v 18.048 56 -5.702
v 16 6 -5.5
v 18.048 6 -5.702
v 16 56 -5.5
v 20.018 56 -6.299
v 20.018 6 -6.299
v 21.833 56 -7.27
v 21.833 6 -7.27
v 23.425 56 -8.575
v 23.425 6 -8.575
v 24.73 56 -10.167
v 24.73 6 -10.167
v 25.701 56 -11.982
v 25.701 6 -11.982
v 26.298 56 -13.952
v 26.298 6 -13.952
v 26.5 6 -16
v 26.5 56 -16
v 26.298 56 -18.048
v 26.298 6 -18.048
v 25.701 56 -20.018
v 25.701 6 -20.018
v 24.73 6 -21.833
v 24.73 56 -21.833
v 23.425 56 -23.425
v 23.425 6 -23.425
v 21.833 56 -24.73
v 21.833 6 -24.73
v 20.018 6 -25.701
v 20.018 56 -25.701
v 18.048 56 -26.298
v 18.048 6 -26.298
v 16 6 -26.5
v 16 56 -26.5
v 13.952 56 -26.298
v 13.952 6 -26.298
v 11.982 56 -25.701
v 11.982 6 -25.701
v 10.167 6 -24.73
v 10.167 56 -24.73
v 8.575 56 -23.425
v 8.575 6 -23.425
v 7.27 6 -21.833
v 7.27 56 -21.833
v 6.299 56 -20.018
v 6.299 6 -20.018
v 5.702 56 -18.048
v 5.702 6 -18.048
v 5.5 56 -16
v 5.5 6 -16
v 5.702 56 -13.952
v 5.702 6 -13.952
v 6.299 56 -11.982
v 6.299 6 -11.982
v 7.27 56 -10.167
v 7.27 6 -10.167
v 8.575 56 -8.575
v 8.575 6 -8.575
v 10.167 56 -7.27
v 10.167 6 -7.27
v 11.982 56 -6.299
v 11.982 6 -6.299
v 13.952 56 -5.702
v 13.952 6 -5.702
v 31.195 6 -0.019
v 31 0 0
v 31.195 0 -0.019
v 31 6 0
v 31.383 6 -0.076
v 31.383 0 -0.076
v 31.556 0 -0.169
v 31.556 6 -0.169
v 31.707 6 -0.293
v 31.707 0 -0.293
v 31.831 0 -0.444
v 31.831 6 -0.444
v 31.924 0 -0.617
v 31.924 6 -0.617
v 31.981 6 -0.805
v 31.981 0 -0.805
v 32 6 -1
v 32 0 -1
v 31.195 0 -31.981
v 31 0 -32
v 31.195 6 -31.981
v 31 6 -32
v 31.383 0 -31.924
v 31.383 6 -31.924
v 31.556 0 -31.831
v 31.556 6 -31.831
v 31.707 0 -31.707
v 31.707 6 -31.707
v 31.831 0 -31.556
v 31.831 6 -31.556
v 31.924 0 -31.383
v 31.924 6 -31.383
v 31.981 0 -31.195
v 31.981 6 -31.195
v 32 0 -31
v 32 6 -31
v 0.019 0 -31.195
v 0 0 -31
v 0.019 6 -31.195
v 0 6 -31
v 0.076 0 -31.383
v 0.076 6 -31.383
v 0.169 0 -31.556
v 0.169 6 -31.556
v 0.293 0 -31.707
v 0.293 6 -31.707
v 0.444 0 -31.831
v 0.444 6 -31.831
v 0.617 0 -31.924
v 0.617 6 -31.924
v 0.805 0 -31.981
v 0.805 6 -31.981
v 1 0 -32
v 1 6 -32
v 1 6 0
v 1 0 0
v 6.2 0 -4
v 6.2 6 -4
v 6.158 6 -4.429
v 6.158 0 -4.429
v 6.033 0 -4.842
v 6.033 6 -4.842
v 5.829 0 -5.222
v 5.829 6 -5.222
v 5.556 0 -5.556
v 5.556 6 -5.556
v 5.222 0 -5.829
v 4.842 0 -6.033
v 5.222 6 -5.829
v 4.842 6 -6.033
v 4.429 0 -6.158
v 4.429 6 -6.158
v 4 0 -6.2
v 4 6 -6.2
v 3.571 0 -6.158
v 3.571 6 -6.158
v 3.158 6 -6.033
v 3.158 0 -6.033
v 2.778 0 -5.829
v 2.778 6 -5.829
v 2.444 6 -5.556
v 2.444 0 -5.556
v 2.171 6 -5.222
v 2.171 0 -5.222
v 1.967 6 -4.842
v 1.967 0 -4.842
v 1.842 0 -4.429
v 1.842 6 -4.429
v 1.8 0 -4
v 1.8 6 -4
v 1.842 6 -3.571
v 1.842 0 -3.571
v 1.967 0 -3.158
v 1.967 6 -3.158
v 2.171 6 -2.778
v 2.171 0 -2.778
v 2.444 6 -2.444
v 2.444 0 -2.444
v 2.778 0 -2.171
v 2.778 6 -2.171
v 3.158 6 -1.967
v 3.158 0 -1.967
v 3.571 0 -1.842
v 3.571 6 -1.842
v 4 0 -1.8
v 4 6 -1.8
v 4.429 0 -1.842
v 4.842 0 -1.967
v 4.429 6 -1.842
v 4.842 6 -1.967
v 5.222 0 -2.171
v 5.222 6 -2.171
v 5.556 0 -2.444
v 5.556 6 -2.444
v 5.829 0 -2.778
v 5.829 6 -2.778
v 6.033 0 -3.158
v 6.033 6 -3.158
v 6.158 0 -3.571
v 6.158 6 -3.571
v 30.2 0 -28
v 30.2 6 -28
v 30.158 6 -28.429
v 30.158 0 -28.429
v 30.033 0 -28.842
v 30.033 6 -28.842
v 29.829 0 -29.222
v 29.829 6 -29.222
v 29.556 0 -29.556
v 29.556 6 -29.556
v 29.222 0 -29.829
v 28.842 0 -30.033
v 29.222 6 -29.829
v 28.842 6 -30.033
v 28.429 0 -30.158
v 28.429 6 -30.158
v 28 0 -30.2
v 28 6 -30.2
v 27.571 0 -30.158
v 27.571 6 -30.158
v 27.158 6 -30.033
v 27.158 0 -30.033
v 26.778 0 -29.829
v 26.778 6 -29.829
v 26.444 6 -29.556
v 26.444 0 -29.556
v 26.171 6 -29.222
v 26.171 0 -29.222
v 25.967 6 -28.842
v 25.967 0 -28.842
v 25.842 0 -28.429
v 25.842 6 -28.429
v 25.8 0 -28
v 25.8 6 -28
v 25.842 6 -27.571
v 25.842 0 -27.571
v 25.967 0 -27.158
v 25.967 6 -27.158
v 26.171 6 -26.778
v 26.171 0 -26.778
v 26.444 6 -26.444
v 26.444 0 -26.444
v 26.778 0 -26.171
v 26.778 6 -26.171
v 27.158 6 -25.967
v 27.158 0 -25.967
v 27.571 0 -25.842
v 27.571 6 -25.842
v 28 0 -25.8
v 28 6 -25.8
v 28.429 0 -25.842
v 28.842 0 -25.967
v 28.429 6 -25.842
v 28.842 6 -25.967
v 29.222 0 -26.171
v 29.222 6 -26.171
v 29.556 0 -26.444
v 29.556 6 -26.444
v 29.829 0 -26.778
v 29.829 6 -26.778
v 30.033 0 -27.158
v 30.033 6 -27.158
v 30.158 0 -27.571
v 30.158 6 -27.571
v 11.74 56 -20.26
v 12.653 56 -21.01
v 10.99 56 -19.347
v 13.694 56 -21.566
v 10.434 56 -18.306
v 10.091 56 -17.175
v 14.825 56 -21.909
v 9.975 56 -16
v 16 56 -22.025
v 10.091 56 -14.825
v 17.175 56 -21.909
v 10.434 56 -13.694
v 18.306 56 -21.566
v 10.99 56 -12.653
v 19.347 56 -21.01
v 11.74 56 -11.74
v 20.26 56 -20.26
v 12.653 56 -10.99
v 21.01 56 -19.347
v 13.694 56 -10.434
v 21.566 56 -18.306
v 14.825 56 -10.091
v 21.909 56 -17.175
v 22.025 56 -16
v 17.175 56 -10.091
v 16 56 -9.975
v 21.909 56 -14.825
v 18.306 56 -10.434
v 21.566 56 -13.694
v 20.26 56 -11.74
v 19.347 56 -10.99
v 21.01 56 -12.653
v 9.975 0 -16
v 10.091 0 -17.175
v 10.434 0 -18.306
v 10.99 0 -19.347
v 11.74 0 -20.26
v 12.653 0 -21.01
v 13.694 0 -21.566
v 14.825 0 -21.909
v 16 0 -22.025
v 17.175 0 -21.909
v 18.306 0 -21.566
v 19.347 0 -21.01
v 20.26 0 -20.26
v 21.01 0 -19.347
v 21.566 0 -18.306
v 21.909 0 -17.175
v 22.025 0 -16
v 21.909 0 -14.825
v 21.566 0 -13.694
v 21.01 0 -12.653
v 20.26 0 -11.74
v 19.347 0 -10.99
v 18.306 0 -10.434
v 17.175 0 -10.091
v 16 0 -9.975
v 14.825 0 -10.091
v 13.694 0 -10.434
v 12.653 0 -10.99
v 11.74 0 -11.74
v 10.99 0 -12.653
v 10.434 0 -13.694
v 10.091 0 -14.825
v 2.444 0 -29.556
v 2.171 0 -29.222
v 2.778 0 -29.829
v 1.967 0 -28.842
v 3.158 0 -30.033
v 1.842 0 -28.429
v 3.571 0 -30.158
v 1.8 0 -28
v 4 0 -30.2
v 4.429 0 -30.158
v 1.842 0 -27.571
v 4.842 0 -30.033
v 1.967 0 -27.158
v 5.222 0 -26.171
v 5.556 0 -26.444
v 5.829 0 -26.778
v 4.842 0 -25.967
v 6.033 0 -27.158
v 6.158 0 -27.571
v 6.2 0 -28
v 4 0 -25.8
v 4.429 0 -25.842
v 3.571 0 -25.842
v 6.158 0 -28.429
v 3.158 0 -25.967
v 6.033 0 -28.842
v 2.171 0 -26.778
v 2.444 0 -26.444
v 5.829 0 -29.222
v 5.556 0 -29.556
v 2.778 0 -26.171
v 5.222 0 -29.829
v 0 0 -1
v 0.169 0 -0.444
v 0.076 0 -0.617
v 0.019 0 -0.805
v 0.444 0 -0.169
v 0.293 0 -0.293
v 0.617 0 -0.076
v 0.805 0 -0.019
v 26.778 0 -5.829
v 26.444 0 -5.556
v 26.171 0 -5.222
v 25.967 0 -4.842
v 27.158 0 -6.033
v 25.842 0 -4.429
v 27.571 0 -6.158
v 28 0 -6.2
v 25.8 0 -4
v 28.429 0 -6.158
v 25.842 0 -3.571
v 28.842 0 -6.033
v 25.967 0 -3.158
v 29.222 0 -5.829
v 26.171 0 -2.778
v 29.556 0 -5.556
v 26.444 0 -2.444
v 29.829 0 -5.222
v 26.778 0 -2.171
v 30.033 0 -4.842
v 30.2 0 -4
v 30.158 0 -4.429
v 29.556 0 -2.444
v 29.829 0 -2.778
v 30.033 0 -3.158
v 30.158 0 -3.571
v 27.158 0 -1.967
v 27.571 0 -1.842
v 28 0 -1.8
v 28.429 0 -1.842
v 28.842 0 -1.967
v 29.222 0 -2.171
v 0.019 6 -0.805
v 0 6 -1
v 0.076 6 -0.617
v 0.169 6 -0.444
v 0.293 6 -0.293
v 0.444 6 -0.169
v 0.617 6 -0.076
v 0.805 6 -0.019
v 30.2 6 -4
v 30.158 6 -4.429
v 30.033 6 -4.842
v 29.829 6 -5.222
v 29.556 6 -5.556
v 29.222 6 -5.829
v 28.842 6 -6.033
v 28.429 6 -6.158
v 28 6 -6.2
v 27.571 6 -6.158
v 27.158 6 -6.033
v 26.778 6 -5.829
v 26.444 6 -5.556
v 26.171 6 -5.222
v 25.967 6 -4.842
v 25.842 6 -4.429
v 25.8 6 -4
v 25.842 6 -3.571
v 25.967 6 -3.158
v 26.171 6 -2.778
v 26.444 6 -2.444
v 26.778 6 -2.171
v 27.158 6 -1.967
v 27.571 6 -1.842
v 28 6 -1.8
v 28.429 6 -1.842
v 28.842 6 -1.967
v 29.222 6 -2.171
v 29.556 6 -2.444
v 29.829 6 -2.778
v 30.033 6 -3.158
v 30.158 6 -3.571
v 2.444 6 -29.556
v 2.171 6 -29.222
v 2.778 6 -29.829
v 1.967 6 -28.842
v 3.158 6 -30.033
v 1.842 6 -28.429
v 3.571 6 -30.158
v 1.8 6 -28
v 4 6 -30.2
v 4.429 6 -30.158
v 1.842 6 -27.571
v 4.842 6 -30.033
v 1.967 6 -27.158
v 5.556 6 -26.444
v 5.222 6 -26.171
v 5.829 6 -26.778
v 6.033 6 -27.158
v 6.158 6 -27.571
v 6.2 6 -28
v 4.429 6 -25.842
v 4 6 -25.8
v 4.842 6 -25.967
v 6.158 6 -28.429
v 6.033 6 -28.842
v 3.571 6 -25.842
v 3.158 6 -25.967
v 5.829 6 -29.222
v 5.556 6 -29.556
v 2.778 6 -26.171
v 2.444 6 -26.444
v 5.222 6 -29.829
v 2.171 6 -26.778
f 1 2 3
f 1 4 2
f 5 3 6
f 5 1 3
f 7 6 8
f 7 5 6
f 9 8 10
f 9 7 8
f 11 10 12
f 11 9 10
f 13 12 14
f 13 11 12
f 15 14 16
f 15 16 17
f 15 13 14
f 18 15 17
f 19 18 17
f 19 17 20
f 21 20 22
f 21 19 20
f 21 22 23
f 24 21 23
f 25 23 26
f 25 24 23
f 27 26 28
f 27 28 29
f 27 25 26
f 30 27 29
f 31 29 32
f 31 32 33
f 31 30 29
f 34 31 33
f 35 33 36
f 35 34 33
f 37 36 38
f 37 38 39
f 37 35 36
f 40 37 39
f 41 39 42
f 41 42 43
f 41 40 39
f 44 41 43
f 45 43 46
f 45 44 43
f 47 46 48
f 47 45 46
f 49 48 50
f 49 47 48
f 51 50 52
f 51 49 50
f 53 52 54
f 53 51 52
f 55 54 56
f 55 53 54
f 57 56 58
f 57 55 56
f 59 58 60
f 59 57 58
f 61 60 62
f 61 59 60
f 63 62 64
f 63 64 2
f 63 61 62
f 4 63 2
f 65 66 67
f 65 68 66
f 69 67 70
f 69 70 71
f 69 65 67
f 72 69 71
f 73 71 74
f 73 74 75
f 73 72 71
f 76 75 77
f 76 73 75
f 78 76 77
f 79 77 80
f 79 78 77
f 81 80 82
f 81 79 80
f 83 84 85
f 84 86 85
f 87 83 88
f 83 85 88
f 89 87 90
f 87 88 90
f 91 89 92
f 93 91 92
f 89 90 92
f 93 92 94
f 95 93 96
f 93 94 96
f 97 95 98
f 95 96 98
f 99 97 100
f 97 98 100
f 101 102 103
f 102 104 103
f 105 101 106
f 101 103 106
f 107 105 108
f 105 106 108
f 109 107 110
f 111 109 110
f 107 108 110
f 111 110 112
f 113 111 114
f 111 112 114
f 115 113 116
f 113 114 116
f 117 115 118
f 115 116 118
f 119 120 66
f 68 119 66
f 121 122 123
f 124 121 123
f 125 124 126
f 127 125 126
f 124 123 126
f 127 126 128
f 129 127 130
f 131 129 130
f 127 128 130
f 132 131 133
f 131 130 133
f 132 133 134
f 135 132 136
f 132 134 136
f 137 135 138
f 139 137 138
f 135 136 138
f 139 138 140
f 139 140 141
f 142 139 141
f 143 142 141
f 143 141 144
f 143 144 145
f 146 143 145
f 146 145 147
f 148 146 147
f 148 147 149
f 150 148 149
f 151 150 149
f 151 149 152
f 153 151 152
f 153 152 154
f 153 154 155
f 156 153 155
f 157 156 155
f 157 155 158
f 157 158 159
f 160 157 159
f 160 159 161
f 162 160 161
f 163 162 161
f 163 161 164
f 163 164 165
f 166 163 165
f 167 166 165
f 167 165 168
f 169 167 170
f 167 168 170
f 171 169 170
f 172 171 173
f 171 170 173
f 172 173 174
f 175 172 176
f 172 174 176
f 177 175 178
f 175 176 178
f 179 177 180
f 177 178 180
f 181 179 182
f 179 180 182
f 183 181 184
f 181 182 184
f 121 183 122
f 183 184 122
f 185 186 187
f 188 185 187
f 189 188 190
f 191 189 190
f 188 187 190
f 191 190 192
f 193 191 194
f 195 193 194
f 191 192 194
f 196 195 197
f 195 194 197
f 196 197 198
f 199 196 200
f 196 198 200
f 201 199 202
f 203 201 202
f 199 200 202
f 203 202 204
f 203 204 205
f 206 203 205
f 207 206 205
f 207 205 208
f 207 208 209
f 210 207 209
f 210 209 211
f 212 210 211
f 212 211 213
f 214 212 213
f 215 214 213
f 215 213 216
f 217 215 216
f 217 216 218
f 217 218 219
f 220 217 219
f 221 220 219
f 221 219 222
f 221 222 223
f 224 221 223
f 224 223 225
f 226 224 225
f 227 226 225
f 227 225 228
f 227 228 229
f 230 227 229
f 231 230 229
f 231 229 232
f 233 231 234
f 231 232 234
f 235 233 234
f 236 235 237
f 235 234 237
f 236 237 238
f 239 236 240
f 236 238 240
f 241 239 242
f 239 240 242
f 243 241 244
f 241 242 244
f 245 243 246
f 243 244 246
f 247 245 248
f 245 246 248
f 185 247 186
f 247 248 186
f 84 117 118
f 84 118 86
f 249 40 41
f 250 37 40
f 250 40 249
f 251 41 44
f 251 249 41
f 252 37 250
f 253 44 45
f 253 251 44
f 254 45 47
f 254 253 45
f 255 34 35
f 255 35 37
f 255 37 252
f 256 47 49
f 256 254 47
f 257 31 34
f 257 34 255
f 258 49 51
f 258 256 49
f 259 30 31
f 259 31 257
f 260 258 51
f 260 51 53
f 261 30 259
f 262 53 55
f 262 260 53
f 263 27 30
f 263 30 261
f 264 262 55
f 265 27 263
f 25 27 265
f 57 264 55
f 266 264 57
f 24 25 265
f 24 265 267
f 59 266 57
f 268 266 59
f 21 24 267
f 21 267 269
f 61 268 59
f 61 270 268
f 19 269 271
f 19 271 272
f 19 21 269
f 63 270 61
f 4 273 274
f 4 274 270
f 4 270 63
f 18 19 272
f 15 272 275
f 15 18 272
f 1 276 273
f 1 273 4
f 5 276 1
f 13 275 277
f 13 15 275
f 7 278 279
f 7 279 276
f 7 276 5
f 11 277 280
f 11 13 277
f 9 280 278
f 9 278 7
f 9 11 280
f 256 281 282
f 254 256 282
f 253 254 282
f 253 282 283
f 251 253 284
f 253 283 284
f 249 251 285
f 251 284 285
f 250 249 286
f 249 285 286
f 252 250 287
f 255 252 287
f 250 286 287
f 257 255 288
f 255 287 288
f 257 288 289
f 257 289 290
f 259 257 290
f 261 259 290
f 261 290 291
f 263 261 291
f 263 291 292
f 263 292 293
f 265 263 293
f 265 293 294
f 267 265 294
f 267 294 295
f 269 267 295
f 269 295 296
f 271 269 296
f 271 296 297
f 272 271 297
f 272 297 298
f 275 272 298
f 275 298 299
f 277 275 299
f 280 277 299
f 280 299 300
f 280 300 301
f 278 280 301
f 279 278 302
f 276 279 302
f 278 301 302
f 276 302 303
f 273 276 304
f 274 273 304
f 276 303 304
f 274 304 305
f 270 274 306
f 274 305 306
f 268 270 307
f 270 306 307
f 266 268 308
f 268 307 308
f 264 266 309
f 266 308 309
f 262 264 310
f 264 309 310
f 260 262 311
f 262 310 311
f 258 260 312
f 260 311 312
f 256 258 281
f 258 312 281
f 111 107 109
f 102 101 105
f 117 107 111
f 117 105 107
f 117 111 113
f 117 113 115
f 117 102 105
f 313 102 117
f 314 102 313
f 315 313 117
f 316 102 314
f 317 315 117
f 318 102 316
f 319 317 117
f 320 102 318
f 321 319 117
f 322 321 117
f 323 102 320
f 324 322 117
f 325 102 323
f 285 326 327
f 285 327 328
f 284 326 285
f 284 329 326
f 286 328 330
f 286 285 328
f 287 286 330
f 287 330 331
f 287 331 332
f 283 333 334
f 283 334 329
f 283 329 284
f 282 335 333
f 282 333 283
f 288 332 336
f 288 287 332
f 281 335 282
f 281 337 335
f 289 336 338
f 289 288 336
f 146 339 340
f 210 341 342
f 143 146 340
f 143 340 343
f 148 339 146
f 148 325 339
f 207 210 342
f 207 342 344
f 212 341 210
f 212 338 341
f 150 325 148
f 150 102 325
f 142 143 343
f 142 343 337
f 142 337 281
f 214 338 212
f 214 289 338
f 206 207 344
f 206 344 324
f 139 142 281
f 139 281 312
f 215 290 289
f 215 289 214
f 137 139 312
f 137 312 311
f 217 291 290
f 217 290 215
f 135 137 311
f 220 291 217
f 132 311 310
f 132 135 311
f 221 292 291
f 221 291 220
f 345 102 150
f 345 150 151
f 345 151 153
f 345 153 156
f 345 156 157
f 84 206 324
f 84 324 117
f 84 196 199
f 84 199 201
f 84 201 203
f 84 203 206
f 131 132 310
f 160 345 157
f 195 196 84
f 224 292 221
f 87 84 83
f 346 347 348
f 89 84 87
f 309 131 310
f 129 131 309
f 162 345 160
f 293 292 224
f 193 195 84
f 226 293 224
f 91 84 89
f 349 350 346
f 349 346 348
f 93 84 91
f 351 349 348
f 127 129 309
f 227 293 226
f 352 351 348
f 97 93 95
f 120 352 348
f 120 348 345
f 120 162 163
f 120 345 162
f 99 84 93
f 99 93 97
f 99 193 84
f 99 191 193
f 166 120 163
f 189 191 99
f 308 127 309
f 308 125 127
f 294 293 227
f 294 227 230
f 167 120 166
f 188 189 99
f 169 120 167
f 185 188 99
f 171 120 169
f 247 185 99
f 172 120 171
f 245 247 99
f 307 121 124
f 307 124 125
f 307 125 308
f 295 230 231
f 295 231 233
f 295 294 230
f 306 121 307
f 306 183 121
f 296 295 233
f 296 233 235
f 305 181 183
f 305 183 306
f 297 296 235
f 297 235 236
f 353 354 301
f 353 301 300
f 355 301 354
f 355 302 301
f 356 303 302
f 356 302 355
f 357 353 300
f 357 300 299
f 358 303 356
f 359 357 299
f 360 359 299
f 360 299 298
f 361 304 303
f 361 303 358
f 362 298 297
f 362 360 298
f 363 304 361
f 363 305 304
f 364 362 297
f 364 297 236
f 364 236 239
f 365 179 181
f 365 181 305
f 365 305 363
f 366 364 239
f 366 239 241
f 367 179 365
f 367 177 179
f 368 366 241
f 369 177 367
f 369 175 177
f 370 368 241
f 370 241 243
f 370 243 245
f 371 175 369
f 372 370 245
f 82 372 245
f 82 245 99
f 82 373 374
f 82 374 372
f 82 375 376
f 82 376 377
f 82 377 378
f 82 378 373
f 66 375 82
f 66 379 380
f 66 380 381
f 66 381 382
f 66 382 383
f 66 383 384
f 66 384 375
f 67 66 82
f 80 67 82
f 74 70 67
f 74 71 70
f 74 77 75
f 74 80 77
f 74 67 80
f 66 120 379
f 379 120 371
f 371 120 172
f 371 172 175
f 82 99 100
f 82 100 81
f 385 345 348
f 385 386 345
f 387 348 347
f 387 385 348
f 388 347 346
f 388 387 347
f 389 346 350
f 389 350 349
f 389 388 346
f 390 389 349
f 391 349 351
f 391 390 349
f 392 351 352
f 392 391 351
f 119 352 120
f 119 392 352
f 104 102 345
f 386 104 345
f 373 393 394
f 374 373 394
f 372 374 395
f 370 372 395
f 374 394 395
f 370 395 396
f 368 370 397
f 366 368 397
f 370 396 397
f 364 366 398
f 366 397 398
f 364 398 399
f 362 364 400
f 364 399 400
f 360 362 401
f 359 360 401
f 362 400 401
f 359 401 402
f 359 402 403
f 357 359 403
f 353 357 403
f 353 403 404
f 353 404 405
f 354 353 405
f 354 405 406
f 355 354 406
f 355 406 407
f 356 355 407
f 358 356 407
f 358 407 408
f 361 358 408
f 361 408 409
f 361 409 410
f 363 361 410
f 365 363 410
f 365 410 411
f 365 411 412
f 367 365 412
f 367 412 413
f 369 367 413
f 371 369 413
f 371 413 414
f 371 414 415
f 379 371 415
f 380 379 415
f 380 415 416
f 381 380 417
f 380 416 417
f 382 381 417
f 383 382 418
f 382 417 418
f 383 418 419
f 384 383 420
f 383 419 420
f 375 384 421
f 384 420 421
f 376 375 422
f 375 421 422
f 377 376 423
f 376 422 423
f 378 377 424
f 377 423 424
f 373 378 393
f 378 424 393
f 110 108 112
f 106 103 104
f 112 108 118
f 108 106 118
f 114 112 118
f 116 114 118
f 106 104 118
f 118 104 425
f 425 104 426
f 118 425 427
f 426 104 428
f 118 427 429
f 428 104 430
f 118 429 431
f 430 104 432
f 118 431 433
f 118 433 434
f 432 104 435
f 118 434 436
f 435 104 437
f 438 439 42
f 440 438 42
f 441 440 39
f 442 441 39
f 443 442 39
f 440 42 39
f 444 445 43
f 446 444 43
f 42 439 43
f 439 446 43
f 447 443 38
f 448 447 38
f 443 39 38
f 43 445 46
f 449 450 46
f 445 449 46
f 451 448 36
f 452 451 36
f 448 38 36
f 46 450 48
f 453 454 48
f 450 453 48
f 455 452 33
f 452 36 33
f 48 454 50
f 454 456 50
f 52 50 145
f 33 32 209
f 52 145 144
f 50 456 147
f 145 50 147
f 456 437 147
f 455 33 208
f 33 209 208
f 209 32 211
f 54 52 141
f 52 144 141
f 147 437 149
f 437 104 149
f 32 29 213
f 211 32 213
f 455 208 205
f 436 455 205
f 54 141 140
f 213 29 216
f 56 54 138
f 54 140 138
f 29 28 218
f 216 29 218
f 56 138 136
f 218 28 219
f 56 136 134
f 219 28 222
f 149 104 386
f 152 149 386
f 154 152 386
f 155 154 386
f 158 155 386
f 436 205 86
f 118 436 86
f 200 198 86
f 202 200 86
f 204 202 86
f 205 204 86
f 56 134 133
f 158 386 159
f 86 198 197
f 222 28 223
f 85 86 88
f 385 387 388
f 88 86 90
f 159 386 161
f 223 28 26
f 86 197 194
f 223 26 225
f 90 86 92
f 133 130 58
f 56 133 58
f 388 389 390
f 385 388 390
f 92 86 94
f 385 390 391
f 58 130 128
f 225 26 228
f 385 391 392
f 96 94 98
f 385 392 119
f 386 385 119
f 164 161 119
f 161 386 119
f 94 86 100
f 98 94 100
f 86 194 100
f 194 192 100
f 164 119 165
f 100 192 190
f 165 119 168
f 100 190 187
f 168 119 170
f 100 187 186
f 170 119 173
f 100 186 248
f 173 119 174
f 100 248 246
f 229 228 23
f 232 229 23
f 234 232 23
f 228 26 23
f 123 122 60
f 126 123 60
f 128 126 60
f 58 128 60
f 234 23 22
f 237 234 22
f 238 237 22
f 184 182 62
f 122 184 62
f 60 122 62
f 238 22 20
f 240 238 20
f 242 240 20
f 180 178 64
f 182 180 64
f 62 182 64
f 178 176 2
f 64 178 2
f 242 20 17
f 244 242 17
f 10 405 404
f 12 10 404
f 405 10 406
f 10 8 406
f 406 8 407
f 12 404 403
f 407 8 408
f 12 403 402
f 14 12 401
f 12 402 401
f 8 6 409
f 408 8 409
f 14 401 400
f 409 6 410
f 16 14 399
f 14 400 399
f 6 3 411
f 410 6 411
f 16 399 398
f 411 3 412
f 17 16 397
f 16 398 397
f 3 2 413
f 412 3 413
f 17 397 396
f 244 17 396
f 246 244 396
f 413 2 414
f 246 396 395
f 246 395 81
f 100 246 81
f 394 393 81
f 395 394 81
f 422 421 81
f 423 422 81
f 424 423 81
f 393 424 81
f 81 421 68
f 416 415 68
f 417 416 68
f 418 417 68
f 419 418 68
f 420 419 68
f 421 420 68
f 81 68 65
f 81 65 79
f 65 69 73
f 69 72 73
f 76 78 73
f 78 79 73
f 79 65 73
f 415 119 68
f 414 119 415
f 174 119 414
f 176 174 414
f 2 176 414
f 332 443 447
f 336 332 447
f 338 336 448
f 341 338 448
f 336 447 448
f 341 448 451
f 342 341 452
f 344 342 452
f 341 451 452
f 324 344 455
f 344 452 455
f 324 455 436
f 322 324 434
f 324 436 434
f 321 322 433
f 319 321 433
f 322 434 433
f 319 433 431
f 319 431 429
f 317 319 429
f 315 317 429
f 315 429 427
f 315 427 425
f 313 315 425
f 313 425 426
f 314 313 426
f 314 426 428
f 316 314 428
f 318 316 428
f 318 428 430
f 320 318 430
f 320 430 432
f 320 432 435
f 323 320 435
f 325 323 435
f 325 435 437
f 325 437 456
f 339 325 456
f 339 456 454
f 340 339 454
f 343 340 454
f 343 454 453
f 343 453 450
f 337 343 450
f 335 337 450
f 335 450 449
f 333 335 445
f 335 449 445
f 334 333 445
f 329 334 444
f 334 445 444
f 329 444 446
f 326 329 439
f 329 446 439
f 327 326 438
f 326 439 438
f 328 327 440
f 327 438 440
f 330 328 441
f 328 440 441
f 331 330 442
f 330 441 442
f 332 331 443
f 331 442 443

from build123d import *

# Parameters (mm, degrees)
SKETCH1_W                      = 32
SKETCH1_H                      = 32
BOSS_EXTRUDE1_DEPTH            = 6
SKETCH2_W                      = 10.5
SKETCH2_H                      = 50
F_4_4_4_4_DIAMETER_HOLE1_D     = 4.4
F_4_4_4_4_DIAMETER_HOLE1_DEPTH = 56
HOLE1_D                        = 12.05
FILLET1_R                      = 1


with BuildPart() as part:
    # Sketch1 → Boss-Extrude1 (new body)
    with BuildSketch(Plane.XZ):
        with Locations((16, -16)):
            Rectangle(SKETCH1_W, SKETCH1_H)
    extrude(amount=-BOSS_EXTRUDE1_DEPTH)

    # Sketch2 → Revolve1 (revolve)
    with BuildSketch(Plane(origin=(0, 0, -16.000000238), x_dir=(-1, 0, 0), z_dir=(0, 0, -1)), mode=Mode.PRIVATE) as revolve1_sk:
        with Locations((-21.250000238, 31)):
            Rectangle(SKETCH2_W, SKETCH2_H)
    revolve(revolve1_sk.sketch.rotate(Axis((16.000000238, 6, -16.000000238), (0, 1, 0)), 270), axis=Axis((16.000000238, 6, -16.000000238), (0, 1, 0)))

    # Ø4.4 (4.4) Diameter Hole1
    with Locations(Plane(origin=(0, 0, 0), x_dir=(-1, 0, 0), z_dir=(0, -1, 0))):
        with Locations((-28, 4), (-28, 28), (-4.00000006, 4.00000006), (-4.00000006, 28.000000417)):
            Hole(F_4_4_4_4_DIAMETER_HOLE1_D / 2, depth=F_4_4_4_4_DIAMETER_HOLE1_DEPTH)

    # Hole1 (through all)
    with Locations(Plane(origin=(0, 56, 0), x_dir=(1, 0, 0), z_dir=(0, 1, 0))):
        with Locations((16.000000238, 16.000000238)):
            Hole(HOLE1_D / 2)

    # Fillet1
    fillet1_edges = [part.edges().sort_by_distance(p)[0] for p in [
        (0, 3, -32),
        (0, 3, 0),
        (32, 3, 0),
        (32, 3, -32),
    ]]
    fillet(fillet1_edges, radius=FILLET1_R)


solid = part.part
